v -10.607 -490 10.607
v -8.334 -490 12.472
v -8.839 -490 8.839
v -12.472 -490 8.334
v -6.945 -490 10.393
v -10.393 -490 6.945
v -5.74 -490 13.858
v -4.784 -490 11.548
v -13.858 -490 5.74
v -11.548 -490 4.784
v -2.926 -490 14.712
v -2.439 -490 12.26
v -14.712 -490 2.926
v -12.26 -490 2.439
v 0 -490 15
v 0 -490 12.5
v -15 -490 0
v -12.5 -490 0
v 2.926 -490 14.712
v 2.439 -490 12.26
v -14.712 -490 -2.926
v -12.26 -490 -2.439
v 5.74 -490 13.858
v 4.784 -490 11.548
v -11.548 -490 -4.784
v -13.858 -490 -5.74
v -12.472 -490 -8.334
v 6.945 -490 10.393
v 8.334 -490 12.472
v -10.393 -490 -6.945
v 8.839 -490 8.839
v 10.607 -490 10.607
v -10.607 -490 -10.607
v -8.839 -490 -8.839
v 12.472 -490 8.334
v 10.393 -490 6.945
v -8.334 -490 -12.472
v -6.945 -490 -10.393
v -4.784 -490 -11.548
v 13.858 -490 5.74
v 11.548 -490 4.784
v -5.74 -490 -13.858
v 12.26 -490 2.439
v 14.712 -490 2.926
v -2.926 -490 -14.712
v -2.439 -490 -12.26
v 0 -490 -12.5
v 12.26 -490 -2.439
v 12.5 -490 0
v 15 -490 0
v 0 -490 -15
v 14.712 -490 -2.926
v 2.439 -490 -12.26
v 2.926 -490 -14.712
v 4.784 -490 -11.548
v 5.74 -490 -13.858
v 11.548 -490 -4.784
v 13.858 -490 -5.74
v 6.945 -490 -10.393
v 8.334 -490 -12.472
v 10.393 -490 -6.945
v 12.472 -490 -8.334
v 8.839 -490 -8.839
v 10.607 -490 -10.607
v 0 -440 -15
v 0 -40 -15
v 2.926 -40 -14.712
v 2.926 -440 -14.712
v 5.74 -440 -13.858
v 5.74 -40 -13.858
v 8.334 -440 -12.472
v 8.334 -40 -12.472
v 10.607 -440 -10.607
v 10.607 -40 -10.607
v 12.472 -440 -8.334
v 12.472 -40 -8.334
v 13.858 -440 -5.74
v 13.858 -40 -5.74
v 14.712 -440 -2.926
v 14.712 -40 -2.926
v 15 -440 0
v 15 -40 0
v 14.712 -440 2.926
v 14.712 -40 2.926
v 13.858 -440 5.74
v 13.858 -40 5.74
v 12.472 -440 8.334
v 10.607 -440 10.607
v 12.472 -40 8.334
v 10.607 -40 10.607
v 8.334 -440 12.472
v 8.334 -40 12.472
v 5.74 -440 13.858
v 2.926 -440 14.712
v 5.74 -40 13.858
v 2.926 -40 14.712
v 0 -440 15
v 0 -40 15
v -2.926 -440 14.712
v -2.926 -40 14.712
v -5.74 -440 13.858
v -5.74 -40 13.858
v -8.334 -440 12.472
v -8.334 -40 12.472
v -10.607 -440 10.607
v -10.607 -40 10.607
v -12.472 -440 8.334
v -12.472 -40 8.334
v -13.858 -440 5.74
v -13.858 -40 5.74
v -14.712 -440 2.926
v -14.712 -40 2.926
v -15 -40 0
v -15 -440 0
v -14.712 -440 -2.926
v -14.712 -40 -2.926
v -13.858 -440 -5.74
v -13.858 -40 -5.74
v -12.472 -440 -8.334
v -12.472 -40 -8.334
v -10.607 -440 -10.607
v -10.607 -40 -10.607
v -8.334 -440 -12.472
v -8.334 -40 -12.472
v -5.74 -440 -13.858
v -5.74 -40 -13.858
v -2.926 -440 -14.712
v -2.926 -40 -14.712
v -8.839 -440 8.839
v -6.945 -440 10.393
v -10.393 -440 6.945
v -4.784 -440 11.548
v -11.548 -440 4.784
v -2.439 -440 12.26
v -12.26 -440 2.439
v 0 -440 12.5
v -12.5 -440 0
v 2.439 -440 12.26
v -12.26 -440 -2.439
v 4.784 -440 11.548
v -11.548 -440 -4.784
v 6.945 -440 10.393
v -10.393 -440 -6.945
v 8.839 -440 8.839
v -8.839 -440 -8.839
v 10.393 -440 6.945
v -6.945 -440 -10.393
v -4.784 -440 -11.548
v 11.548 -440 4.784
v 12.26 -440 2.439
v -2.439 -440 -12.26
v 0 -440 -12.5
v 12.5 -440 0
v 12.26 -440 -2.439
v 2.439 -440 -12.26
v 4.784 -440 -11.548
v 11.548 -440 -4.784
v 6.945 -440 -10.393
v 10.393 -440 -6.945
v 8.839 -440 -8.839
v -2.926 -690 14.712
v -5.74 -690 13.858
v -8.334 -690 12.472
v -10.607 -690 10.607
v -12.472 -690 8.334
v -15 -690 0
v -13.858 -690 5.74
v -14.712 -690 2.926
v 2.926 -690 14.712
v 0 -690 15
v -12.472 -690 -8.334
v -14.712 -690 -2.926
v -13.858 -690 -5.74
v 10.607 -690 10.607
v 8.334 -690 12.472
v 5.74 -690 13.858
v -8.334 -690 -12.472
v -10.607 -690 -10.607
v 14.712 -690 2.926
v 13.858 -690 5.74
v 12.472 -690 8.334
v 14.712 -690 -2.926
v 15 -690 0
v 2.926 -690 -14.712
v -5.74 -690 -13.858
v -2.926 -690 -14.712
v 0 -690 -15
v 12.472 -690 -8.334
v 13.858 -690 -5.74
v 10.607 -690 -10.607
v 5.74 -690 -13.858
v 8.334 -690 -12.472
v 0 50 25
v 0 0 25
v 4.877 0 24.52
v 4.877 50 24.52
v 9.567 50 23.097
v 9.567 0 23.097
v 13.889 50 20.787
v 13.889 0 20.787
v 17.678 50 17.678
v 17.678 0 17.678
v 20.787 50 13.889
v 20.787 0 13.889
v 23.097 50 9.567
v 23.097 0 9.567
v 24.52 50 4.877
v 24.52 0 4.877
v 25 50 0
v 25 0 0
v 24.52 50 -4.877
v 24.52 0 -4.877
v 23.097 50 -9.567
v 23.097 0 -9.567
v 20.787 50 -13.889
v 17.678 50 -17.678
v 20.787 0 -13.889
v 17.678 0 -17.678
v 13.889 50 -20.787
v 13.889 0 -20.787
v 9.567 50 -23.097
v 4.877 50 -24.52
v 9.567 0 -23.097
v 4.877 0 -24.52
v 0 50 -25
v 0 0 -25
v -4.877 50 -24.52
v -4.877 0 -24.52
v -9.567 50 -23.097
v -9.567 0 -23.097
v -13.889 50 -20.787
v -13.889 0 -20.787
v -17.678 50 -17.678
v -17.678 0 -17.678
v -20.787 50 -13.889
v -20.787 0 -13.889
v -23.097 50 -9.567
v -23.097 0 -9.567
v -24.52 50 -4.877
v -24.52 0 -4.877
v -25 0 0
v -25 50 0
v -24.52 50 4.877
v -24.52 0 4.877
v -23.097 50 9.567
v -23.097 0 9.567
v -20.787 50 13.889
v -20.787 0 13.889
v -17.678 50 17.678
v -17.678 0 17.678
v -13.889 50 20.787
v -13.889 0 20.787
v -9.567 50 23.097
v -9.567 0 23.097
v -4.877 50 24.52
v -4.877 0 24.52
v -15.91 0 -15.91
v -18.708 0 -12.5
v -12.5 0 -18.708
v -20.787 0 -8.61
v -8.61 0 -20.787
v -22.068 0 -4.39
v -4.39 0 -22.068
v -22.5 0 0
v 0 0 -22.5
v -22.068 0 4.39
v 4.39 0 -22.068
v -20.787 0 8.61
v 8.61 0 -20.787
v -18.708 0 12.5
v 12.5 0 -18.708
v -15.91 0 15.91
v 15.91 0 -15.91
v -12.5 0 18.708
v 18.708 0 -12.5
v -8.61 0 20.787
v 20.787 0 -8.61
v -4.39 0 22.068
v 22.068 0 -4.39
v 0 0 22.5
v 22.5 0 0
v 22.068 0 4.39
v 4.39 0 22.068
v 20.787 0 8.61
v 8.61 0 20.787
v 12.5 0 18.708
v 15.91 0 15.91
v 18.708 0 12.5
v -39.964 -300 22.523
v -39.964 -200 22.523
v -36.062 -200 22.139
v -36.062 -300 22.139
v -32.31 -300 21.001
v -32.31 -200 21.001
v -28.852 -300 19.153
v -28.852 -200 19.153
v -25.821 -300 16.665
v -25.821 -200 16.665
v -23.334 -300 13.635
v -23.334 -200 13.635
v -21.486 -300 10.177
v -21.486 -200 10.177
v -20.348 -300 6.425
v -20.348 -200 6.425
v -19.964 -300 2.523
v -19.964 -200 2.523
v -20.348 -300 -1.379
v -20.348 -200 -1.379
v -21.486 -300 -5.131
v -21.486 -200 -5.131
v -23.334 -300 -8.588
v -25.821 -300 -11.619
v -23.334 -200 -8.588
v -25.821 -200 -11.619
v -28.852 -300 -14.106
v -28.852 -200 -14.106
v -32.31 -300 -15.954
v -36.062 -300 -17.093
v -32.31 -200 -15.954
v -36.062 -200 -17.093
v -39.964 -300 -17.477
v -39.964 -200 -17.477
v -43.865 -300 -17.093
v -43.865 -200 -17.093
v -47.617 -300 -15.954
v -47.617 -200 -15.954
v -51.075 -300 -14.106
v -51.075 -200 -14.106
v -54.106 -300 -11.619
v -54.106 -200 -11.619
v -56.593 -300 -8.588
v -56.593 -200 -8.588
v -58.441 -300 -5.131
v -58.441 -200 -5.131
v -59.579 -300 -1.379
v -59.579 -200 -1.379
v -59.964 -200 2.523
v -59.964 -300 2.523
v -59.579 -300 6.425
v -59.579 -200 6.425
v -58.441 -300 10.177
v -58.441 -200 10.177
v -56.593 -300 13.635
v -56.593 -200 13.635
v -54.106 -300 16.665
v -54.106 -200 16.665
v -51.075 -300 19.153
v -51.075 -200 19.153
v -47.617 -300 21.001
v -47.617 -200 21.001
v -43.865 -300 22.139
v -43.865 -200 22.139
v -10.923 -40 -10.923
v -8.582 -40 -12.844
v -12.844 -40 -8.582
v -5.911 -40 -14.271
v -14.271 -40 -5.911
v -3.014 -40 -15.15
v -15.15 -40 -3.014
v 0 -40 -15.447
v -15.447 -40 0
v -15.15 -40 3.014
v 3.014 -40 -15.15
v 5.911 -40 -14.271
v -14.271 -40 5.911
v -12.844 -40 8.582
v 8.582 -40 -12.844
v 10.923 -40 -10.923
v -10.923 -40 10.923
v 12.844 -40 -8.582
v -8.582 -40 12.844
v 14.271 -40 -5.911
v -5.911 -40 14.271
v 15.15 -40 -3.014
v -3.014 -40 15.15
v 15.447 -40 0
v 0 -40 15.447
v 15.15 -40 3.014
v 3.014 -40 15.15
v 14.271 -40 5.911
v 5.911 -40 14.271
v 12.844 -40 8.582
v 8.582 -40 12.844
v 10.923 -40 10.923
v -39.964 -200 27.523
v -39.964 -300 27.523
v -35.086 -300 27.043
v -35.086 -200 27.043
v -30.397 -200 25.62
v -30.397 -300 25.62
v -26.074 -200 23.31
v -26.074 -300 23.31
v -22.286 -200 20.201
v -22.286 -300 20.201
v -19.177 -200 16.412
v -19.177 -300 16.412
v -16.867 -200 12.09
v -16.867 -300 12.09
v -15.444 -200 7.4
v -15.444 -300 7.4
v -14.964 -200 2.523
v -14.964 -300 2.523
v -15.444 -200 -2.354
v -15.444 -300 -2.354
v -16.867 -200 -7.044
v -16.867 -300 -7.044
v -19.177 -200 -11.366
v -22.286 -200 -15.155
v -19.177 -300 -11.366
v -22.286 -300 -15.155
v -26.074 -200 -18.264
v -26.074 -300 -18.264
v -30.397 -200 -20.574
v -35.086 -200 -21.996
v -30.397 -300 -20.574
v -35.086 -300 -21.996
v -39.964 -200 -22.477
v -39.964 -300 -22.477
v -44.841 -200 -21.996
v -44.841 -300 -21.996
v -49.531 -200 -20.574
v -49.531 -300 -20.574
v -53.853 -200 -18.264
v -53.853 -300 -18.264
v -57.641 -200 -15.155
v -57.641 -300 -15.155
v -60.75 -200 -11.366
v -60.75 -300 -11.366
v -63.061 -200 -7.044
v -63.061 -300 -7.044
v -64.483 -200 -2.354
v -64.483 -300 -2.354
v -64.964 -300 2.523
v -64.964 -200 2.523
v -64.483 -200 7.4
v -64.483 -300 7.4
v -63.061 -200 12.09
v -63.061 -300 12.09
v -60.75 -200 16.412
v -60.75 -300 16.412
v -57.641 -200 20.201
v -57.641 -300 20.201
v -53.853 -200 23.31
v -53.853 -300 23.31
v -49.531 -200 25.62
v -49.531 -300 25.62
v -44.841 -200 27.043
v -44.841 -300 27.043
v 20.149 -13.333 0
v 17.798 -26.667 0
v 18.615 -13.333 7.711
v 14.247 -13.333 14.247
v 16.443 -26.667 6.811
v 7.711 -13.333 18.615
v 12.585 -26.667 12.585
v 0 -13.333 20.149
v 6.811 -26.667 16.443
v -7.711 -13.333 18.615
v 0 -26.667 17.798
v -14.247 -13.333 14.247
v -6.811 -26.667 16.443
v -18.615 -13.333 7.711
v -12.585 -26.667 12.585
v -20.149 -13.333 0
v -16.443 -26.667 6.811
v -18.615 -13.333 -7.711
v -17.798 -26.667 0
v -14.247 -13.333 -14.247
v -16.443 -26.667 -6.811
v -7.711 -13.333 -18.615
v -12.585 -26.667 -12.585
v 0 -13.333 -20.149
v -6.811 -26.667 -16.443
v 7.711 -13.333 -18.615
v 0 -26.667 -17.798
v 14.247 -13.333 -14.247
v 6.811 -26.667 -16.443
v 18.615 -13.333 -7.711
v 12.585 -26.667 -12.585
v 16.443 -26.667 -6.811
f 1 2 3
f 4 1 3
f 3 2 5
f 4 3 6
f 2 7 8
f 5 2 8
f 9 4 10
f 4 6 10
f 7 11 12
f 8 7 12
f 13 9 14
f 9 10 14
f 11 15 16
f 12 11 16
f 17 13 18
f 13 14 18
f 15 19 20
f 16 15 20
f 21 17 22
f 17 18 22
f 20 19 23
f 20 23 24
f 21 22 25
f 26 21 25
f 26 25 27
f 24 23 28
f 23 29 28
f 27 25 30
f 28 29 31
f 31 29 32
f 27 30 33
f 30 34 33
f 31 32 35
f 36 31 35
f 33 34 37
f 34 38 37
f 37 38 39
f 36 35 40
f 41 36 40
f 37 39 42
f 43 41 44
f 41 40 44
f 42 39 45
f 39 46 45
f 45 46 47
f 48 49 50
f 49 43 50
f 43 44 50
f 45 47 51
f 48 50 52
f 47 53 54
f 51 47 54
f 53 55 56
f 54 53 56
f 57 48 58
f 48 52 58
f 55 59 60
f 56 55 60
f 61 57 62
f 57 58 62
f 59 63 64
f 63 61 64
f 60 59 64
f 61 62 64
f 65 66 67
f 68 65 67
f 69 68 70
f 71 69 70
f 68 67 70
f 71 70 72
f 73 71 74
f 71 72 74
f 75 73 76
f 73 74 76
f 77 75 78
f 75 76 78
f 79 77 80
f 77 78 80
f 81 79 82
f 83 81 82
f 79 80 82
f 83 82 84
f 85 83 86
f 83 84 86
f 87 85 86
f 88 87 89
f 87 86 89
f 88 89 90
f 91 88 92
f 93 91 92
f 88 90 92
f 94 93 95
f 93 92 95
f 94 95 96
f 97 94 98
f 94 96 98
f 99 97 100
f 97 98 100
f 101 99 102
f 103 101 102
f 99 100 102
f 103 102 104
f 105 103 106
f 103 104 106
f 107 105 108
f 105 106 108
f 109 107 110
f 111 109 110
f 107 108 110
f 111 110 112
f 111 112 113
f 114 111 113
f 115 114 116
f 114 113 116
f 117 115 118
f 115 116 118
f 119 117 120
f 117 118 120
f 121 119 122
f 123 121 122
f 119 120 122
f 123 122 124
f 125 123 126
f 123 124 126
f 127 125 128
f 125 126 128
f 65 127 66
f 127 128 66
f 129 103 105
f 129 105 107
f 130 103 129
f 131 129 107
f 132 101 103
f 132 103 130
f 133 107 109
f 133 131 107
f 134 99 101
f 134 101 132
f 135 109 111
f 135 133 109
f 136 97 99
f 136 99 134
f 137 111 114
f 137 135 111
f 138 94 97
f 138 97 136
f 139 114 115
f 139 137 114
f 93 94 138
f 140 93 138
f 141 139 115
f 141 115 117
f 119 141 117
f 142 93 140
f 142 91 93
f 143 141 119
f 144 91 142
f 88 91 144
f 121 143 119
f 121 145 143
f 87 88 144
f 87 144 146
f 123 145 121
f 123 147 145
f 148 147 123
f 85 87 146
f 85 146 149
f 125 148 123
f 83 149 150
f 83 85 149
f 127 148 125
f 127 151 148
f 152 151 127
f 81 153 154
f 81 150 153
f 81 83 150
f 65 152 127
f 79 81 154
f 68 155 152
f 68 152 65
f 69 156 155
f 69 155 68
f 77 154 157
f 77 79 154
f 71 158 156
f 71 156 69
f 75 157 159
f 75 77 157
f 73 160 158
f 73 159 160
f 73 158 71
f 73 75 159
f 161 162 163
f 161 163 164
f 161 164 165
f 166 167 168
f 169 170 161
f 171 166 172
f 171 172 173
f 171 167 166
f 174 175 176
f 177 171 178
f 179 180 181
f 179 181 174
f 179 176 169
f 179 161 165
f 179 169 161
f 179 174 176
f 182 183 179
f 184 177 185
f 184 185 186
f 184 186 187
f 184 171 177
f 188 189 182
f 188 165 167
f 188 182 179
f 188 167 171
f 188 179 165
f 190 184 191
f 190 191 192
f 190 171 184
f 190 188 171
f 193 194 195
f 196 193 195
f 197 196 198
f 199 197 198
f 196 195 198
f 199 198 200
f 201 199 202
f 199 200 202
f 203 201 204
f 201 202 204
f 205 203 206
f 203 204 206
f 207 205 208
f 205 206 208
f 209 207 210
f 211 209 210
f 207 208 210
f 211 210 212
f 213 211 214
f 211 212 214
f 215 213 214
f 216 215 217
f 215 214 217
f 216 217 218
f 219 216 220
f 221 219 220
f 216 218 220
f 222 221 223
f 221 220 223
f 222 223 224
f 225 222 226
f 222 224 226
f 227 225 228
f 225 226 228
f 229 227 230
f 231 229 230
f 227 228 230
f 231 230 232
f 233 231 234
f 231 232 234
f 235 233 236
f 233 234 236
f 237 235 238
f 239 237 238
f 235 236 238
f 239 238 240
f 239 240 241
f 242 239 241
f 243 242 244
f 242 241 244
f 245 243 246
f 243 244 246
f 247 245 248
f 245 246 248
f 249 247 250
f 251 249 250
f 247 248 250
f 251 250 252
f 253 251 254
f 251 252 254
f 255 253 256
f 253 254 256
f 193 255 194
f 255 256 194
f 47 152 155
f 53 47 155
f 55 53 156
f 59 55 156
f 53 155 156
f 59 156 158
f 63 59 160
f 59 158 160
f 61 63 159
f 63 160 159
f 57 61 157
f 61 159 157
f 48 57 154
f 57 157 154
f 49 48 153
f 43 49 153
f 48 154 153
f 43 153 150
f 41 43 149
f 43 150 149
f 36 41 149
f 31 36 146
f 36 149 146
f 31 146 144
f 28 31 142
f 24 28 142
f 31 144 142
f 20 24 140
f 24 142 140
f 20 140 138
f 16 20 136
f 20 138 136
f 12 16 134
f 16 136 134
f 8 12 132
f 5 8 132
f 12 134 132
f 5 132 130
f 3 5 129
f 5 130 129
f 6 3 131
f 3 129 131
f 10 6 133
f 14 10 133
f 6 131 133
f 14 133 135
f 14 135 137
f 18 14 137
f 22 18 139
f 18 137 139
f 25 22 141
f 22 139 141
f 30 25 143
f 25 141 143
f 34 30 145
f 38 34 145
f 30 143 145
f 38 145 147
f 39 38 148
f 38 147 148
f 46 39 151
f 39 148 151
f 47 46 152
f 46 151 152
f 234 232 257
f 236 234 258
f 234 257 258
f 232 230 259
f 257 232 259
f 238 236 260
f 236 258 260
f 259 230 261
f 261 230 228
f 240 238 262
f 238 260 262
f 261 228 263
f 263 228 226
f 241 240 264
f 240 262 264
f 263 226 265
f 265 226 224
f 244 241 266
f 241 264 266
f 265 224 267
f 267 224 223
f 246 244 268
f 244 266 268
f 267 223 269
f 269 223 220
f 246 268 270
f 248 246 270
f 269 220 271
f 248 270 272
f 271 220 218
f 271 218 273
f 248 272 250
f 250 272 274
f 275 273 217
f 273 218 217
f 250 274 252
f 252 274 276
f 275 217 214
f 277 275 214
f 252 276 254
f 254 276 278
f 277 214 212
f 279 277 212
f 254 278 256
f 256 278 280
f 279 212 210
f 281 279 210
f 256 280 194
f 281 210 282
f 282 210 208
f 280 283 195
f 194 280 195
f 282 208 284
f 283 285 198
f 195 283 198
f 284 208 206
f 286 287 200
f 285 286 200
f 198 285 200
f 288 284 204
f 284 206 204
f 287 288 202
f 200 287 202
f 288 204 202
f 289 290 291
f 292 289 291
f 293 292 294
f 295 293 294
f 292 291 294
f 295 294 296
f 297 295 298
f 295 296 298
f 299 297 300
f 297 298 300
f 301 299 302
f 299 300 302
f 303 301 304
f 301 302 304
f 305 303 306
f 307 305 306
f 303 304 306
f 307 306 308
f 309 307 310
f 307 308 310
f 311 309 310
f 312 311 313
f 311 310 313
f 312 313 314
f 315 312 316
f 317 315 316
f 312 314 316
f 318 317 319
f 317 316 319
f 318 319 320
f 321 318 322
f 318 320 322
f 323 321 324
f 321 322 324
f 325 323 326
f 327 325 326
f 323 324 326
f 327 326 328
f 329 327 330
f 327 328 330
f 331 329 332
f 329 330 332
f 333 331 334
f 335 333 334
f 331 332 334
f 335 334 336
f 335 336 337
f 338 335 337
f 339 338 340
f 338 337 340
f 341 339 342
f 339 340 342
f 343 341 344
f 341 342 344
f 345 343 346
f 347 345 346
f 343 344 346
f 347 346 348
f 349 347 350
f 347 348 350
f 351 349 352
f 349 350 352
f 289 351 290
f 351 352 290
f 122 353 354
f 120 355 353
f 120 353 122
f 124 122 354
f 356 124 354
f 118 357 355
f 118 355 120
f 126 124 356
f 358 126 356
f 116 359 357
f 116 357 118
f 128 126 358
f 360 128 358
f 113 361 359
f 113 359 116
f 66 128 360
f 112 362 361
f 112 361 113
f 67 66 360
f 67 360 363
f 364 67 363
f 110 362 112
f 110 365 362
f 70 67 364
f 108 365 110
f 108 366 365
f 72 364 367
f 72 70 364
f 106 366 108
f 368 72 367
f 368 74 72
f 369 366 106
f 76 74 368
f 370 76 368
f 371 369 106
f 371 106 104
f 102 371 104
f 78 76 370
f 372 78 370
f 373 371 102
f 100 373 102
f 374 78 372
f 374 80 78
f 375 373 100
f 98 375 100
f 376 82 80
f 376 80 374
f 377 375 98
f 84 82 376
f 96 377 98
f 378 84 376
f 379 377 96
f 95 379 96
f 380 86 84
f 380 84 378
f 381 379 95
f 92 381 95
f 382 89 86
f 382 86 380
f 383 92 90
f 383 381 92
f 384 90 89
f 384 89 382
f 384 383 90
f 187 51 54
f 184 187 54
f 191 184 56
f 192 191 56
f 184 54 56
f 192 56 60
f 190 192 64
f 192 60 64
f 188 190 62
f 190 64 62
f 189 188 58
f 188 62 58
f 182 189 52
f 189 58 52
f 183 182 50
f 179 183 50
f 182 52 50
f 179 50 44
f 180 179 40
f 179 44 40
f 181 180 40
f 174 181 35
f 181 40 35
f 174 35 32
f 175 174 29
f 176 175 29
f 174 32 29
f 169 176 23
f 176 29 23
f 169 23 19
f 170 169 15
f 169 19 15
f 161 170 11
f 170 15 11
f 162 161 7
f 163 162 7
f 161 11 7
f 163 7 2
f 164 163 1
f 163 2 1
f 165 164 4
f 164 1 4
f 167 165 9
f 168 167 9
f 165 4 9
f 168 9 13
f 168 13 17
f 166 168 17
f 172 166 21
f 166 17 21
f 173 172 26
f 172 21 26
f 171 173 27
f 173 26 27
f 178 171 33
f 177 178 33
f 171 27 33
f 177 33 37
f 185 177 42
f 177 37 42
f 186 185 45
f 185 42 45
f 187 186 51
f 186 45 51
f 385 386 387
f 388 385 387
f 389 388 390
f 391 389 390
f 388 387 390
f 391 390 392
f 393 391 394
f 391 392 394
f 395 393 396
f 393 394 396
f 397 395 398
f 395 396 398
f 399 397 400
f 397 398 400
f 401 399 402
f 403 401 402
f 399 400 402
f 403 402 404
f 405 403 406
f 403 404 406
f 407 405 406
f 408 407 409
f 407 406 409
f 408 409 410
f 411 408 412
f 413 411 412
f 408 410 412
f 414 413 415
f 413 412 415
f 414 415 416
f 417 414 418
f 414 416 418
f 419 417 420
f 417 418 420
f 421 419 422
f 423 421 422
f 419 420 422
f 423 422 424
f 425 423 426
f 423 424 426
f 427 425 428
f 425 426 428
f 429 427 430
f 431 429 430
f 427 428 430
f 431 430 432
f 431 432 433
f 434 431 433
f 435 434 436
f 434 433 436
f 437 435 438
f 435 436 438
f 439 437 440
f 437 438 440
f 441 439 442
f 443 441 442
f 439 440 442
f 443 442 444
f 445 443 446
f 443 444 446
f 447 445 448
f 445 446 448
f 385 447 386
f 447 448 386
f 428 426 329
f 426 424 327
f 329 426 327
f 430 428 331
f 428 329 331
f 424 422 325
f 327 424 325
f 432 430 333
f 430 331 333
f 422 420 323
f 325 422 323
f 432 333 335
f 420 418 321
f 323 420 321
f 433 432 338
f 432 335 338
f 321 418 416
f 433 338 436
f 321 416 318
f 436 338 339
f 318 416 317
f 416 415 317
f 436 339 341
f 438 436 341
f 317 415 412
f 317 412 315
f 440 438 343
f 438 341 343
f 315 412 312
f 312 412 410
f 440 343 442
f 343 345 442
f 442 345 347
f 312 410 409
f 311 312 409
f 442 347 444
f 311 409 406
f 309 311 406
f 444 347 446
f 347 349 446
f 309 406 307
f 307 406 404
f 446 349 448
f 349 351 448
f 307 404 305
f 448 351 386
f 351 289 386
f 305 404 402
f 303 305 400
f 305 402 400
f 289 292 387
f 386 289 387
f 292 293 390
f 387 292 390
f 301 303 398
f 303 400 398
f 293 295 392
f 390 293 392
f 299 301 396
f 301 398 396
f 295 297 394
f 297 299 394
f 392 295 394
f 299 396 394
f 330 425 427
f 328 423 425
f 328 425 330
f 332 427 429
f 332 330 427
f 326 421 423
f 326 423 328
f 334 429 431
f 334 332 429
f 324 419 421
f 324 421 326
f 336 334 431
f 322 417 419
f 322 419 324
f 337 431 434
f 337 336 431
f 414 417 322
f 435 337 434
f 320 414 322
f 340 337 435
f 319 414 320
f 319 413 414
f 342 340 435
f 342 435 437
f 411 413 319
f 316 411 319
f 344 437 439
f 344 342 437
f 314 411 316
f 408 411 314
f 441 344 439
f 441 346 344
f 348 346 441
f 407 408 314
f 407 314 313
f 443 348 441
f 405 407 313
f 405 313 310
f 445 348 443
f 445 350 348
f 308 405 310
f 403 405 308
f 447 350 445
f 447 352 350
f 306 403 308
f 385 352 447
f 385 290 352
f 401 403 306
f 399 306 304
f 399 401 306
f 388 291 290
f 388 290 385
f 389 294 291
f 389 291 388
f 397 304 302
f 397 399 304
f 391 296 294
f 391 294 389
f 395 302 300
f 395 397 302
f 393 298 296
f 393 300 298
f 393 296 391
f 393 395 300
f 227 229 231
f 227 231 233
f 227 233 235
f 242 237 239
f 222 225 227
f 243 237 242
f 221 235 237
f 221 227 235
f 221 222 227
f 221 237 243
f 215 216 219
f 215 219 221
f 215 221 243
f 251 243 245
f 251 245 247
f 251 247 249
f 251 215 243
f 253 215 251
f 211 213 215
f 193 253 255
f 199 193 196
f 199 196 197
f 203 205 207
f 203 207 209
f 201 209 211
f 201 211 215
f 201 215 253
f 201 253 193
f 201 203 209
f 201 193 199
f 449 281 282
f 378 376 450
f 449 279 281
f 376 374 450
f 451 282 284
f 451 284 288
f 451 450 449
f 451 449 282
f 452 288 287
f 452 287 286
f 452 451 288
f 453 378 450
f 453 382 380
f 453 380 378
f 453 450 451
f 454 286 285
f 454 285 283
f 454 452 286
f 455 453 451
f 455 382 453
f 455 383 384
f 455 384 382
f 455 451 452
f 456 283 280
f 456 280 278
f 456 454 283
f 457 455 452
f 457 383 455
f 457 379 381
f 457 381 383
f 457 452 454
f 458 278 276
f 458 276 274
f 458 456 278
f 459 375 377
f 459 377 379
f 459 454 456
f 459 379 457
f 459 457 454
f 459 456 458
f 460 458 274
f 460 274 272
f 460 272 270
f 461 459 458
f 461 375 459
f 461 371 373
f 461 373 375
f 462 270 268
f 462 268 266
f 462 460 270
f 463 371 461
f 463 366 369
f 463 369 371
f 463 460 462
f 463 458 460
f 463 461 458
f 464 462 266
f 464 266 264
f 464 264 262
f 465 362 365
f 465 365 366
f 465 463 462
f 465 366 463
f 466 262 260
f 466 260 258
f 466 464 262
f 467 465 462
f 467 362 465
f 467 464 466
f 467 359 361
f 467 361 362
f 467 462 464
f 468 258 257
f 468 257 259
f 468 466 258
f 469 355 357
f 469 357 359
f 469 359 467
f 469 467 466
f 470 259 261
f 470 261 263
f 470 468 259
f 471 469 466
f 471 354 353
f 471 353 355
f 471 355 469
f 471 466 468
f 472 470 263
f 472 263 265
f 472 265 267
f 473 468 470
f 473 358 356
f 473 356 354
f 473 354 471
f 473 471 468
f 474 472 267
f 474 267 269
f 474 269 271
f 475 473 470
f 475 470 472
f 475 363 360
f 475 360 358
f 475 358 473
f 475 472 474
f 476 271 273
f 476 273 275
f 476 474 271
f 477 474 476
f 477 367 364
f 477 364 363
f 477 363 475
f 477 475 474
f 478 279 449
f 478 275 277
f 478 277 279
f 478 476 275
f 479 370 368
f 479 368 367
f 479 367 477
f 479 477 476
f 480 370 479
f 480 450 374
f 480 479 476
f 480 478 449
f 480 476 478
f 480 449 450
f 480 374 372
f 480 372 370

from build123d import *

# Parameters (mm, degrees)
SKETCH1_R           = 25
BOSS_EXTRUDE2_DEPTH = 50
SKETCH3_R           = 22.5
BOSS_EXTRUDE4_DEPTH = 40
BOSS_EXTRUDE4_TAPER = 10
SKETCH5_R           = 15
BOSS_EXTRUDE5_DEPTH = 400
SKETCH7_R           = 25
BOSS_EXTRUDE6_DEPTH = 100
SKETCH8_R           = 20
CUT_EXTRUDE1_DEPTH  = 100
SKETCH10_R          = 12.5
BOSS_EXTRUDE7_DEPTH = 50
SKETCH11_R          = 15
BOSS_EXTRUDE8_DEPTH = 200


with BuildPart() as part:
    # Sketch1 → Boss-Extrude2 (new body)
    with BuildSketch(Plane(origin=(0, 0, 0), x_dir=(1, 0, 0), z_dir=(0, 1, 0))):
        with Locations(Location((0, 0, 0), (0, 0, 270))):
            Circle(SKETCH1_R)
    extrude(amount=BOSS_EXTRUDE2_DEPTH)

    # Sketch3 → Boss-Extrude4 (add)
    with BuildSketch(Plane.XZ):
        Circle(SKETCH3_R)
    extrude(amount=BOSS_EXTRUDE4_DEPTH, taper=BOSS_EXTRUDE4_TAPER)

    # Sketch5 → Boss-Extrude5 (add)
    with BuildSketch(Plane.XZ.offset(40)):
        with Locations(Location((0, 0, 0), (0, 0, 270))):
            Circle(SKETCH5_R)
    extrude(amount=BOSS_EXTRUDE5_DEPTH)

    # Sketch10 → Boss-Extrude7 (add)
    with BuildSketch(Plane.XZ.offset(440)):
        with Locations(Location((0, 0, 0), (0, 0, 270))):
            Circle(SKETCH10_R)
    extrude(amount=BOSS_EXTRUDE7_DEPTH)

    # Sketch11 → Boss-Extrude8 (add)
    with BuildSketch(Plane.XZ.offset(490)):
        with Locations(Location((0, 0, 0), (0, 0, 270))):
            Circle(SKETCH11_R)
    extrude(amount=BOSS_EXTRUDE8_DEPTH)


with BuildPart() as body_2:
    # Sketch7 → Boss-Extrude6 (new body)
    with BuildSketch(Plane(origin=(0, -300, 0), x_dir=(1, 0, 0), z_dir=(0, 1, 0))):
        with Locations(Location((-39.963624291, -2.523145335, 0), (0, 0, 270))):
            Circle(SKETCH7_R)
    extrude(amount=BOSS_EXTRUDE6_DEPTH)

    # Sketch8 → Cut-Extrude1 (cut)
    with BuildSketch(Plane(origin=(0, -200, 0), x_dir=(1, 0, 0), z_dir=(0, 1, 0))):
        with Locations(Location((-39.963624291, -2.523145335, 0), (0, 0, 270))):
            Circle(SKETCH8_R)
    extrude(amount=-CUT_EXTRUDE1_DEPTH, mode=Mode.SUBTRACT)


solid = Compound([part.part, body_2.part])
